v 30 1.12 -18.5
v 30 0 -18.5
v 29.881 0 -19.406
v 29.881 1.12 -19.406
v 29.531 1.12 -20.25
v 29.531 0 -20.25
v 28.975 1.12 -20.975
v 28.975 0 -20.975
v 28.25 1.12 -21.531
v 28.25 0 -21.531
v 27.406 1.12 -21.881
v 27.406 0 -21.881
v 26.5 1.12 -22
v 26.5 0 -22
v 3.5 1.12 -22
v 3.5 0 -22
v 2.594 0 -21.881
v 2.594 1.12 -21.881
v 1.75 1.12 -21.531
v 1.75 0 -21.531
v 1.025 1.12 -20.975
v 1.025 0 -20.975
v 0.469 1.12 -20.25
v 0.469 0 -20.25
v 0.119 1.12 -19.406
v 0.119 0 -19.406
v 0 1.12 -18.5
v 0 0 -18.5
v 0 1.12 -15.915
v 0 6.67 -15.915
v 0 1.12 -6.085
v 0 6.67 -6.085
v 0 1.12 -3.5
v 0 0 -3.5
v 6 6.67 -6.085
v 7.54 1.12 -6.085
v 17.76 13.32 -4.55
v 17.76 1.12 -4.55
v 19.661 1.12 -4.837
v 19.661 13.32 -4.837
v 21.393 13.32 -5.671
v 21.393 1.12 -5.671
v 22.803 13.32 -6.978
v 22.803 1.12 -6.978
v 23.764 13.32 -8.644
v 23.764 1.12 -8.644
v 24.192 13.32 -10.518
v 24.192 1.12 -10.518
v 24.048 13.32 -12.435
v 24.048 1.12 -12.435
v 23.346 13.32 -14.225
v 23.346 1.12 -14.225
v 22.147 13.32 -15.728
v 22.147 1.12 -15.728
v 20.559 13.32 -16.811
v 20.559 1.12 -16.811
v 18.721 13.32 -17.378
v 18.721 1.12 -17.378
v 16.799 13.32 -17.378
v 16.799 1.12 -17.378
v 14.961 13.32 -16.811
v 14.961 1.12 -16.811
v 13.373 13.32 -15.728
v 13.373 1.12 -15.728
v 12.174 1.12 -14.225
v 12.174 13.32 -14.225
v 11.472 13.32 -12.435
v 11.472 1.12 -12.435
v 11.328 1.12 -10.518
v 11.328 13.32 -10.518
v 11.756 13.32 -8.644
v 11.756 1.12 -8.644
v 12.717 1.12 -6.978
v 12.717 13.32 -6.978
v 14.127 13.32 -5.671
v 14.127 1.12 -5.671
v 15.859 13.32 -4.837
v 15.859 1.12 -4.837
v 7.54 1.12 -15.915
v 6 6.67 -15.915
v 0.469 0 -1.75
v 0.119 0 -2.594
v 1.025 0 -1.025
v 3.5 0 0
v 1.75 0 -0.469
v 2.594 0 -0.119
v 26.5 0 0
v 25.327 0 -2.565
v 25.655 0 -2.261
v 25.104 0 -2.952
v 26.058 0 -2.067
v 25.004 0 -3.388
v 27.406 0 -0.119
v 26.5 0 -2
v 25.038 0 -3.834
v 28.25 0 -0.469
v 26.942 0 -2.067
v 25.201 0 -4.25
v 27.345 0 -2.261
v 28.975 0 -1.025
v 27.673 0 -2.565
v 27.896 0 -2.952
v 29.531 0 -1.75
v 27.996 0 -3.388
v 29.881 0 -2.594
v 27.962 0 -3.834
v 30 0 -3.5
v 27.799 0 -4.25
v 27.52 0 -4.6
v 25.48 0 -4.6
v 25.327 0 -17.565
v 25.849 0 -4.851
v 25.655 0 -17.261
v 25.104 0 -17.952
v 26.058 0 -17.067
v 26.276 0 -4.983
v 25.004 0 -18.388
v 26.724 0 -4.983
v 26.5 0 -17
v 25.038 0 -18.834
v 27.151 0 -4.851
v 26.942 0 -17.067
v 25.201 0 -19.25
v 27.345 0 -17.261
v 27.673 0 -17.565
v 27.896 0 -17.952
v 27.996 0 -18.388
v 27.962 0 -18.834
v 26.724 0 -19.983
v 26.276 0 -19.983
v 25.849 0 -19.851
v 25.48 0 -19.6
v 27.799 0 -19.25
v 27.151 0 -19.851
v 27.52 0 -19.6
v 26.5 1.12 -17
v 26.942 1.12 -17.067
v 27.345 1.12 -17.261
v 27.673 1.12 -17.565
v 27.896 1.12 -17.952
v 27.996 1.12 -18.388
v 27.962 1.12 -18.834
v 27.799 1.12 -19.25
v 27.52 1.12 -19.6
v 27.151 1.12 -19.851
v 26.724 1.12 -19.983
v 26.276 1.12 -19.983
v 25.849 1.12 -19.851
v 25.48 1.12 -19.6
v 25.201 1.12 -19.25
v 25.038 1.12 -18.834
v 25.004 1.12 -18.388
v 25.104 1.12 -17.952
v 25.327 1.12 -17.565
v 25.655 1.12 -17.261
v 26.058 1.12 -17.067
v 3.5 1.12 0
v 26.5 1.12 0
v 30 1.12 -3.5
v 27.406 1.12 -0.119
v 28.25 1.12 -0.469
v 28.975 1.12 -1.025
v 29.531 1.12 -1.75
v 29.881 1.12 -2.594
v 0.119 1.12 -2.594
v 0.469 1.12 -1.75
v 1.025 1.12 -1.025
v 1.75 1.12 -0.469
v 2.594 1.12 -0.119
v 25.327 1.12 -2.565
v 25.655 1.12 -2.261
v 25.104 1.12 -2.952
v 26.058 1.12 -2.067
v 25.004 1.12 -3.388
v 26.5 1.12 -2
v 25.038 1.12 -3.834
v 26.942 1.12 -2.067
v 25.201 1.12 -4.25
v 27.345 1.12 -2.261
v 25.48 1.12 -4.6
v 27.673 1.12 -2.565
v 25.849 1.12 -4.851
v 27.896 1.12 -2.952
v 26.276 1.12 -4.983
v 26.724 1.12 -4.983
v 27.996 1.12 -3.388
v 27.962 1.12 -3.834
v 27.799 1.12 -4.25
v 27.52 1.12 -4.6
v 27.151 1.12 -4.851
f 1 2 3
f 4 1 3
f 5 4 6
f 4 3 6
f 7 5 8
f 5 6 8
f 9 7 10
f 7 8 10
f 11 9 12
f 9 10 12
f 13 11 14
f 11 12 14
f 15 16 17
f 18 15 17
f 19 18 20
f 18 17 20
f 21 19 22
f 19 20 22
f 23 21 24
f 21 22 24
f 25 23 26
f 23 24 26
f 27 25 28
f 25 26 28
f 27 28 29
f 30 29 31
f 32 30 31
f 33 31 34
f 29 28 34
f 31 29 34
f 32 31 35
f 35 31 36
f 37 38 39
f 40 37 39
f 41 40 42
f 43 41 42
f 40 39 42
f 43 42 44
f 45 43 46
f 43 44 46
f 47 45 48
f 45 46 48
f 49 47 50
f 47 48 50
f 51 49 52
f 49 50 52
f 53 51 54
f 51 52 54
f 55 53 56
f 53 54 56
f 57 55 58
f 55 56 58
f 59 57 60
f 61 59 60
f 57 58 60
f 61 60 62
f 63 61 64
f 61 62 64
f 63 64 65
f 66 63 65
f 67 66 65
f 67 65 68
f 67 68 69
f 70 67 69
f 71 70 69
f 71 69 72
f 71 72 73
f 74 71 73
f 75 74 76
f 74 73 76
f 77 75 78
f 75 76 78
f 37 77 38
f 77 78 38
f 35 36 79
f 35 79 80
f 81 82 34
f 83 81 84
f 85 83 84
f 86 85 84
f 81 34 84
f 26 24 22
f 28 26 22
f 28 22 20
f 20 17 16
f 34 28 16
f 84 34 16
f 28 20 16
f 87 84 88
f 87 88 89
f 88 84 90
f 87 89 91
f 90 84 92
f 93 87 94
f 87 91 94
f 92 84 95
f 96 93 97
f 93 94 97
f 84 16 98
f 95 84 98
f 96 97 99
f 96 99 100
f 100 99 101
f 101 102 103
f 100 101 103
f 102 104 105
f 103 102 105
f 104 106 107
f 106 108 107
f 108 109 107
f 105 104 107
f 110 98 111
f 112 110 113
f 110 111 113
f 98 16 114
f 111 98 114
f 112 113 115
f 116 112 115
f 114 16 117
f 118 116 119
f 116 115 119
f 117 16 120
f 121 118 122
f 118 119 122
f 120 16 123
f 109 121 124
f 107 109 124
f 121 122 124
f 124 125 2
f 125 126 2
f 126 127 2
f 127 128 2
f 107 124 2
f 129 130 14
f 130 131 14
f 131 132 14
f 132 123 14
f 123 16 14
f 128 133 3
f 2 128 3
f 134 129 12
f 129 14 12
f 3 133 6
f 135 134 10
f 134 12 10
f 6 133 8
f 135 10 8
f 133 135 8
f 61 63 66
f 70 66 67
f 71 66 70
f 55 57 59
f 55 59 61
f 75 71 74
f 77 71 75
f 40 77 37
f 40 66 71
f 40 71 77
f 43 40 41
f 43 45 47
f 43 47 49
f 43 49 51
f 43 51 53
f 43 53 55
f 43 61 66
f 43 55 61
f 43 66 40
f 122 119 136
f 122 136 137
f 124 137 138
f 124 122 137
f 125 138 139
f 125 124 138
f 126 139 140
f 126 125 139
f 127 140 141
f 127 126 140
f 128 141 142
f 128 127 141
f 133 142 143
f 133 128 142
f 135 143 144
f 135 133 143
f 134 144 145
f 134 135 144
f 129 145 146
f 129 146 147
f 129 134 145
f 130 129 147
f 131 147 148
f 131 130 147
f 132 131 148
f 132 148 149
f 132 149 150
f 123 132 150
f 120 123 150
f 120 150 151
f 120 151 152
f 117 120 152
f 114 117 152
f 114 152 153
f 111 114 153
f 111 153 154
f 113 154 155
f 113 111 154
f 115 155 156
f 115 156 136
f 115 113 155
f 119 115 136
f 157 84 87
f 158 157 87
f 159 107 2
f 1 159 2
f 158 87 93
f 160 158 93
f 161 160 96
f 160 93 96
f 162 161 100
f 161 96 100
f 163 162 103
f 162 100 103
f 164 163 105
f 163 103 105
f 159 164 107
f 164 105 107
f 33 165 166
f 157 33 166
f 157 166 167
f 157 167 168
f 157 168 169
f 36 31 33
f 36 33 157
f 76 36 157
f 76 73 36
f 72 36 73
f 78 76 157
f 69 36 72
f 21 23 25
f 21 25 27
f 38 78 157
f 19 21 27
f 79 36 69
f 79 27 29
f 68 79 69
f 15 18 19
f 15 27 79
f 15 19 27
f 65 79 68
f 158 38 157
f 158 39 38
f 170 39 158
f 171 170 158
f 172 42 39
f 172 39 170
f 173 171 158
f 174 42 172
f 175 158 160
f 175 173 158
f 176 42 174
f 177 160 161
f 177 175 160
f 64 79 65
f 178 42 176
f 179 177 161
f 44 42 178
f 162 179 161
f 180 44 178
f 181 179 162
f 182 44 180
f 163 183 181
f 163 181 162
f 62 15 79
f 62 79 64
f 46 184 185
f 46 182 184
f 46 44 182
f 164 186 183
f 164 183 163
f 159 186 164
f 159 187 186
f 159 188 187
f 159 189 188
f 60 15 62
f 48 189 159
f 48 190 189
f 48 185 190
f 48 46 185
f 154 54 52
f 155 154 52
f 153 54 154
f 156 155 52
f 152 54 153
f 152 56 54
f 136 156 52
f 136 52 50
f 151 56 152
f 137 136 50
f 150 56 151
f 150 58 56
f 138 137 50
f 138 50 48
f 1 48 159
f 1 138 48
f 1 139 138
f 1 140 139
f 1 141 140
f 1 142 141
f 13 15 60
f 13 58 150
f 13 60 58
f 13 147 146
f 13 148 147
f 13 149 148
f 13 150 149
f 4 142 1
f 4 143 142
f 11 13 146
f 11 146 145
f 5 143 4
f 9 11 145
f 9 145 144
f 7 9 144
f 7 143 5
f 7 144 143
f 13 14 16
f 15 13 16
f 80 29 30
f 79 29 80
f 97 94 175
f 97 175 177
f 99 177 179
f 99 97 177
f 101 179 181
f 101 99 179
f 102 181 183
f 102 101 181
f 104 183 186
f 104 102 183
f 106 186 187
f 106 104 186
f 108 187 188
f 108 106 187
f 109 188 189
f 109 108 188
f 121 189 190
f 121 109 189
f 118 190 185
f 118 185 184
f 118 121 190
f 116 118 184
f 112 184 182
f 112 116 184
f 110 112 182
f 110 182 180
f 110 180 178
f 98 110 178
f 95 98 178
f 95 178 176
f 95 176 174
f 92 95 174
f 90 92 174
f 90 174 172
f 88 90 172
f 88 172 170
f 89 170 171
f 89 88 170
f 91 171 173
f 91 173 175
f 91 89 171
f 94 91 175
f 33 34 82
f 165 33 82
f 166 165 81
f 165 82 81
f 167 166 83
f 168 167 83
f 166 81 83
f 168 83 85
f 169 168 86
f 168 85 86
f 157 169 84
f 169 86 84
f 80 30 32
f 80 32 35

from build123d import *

# Parameters (mm, degrees)
SKETCH1_R           = 1.5
BOSS_EXTRUDE1_DEPTH = 1.12
SKETCH2_W           = 6
SKETCH2_H           = 9.83
BOSS_EXTRUDE2_DEPTH = 5.55
BOSS_EXTRUDE3_DEPTH = 9.83
SKETCH4_R           = 6.45
BOSS_EXTRUDE4_DEPTH = 12.2


with BuildPart() as part:
    # Sketch1 → Boss-Extrude1 (new body)
    with BuildSketch(Plane(origin=(0, 0, 0), x_dir=(1, 0, 0), z_dir=(0, 1, 0))):
        with BuildLine():
            Line((3.5, 0), (26.5, 0))
            ThreePointArc((26.5, 0), (28.974873734, 1.025126266), (30, 3.5))
            Line((30, 3.5), (30, 18.5))
            ThreePointArc((30, 18.5), (28.974873734, 20.974873734), (26.5, 22))
            Line((26.5, 22), (3.5, 22))
            ThreePointArc((3.5, 22), (1.025126266, 20.974873734), (0, 18.5))
            Line((0, 18.5), (0, 3.5))
            ThreePointArc((0, 3.5), (1.025126266, 1.025126266), (3.5, 0))
        make_face()
        with Locations(Location((26.5, 18.5, 0), (0, 0, 270))):
            Circle(SKETCH1_R, mode=Mode.SUBTRACT)
        with Locations(Location((26.5, 3.5, 0), (0, 0, 270))):
            Circle(SKETCH1_R, mode=Mode.SUBTRACT)
    extrude(amount=BOSS_EXTRUDE1_DEPTH)

    # Sketch2 → Boss-Extrude2 (add)
    with BuildSketch(Plane(origin=(0, 1.12, 0), x_dir=(1, 0, 0), z_dir=(0, 1, 0))):
        with Locations((3, 11)):
            Rectangle(SKETCH2_W, SKETCH2_H)
    extrude(amount=BOSS_EXTRUDE2_DEPTH)

    # Sketch3 → Boss-Extrude3 (add)
    with BuildSketch(Plane.XY.offset(-6.085)):
        Polygon((0, 1.12), (7.54, 1.12), (6, 6.67), (0, 6.67), align=None)
    extrude(amount=-BOSS_EXTRUDE3_DEPTH)

    # Sketch4 → Boss-Extrude4 (add)
    with BuildSketch(Plane(origin=(0, 1.12, 0), x_dir=(1, 0, 0), z_dir=(0, 1, 0))):
        with Locations(Location((17.76, 11, 0), (0, 0, 270))):
            Circle(SKETCH4_R)
    extrude(amount=BOSS_EXTRUDE4_DEPTH)


solid = part.part
